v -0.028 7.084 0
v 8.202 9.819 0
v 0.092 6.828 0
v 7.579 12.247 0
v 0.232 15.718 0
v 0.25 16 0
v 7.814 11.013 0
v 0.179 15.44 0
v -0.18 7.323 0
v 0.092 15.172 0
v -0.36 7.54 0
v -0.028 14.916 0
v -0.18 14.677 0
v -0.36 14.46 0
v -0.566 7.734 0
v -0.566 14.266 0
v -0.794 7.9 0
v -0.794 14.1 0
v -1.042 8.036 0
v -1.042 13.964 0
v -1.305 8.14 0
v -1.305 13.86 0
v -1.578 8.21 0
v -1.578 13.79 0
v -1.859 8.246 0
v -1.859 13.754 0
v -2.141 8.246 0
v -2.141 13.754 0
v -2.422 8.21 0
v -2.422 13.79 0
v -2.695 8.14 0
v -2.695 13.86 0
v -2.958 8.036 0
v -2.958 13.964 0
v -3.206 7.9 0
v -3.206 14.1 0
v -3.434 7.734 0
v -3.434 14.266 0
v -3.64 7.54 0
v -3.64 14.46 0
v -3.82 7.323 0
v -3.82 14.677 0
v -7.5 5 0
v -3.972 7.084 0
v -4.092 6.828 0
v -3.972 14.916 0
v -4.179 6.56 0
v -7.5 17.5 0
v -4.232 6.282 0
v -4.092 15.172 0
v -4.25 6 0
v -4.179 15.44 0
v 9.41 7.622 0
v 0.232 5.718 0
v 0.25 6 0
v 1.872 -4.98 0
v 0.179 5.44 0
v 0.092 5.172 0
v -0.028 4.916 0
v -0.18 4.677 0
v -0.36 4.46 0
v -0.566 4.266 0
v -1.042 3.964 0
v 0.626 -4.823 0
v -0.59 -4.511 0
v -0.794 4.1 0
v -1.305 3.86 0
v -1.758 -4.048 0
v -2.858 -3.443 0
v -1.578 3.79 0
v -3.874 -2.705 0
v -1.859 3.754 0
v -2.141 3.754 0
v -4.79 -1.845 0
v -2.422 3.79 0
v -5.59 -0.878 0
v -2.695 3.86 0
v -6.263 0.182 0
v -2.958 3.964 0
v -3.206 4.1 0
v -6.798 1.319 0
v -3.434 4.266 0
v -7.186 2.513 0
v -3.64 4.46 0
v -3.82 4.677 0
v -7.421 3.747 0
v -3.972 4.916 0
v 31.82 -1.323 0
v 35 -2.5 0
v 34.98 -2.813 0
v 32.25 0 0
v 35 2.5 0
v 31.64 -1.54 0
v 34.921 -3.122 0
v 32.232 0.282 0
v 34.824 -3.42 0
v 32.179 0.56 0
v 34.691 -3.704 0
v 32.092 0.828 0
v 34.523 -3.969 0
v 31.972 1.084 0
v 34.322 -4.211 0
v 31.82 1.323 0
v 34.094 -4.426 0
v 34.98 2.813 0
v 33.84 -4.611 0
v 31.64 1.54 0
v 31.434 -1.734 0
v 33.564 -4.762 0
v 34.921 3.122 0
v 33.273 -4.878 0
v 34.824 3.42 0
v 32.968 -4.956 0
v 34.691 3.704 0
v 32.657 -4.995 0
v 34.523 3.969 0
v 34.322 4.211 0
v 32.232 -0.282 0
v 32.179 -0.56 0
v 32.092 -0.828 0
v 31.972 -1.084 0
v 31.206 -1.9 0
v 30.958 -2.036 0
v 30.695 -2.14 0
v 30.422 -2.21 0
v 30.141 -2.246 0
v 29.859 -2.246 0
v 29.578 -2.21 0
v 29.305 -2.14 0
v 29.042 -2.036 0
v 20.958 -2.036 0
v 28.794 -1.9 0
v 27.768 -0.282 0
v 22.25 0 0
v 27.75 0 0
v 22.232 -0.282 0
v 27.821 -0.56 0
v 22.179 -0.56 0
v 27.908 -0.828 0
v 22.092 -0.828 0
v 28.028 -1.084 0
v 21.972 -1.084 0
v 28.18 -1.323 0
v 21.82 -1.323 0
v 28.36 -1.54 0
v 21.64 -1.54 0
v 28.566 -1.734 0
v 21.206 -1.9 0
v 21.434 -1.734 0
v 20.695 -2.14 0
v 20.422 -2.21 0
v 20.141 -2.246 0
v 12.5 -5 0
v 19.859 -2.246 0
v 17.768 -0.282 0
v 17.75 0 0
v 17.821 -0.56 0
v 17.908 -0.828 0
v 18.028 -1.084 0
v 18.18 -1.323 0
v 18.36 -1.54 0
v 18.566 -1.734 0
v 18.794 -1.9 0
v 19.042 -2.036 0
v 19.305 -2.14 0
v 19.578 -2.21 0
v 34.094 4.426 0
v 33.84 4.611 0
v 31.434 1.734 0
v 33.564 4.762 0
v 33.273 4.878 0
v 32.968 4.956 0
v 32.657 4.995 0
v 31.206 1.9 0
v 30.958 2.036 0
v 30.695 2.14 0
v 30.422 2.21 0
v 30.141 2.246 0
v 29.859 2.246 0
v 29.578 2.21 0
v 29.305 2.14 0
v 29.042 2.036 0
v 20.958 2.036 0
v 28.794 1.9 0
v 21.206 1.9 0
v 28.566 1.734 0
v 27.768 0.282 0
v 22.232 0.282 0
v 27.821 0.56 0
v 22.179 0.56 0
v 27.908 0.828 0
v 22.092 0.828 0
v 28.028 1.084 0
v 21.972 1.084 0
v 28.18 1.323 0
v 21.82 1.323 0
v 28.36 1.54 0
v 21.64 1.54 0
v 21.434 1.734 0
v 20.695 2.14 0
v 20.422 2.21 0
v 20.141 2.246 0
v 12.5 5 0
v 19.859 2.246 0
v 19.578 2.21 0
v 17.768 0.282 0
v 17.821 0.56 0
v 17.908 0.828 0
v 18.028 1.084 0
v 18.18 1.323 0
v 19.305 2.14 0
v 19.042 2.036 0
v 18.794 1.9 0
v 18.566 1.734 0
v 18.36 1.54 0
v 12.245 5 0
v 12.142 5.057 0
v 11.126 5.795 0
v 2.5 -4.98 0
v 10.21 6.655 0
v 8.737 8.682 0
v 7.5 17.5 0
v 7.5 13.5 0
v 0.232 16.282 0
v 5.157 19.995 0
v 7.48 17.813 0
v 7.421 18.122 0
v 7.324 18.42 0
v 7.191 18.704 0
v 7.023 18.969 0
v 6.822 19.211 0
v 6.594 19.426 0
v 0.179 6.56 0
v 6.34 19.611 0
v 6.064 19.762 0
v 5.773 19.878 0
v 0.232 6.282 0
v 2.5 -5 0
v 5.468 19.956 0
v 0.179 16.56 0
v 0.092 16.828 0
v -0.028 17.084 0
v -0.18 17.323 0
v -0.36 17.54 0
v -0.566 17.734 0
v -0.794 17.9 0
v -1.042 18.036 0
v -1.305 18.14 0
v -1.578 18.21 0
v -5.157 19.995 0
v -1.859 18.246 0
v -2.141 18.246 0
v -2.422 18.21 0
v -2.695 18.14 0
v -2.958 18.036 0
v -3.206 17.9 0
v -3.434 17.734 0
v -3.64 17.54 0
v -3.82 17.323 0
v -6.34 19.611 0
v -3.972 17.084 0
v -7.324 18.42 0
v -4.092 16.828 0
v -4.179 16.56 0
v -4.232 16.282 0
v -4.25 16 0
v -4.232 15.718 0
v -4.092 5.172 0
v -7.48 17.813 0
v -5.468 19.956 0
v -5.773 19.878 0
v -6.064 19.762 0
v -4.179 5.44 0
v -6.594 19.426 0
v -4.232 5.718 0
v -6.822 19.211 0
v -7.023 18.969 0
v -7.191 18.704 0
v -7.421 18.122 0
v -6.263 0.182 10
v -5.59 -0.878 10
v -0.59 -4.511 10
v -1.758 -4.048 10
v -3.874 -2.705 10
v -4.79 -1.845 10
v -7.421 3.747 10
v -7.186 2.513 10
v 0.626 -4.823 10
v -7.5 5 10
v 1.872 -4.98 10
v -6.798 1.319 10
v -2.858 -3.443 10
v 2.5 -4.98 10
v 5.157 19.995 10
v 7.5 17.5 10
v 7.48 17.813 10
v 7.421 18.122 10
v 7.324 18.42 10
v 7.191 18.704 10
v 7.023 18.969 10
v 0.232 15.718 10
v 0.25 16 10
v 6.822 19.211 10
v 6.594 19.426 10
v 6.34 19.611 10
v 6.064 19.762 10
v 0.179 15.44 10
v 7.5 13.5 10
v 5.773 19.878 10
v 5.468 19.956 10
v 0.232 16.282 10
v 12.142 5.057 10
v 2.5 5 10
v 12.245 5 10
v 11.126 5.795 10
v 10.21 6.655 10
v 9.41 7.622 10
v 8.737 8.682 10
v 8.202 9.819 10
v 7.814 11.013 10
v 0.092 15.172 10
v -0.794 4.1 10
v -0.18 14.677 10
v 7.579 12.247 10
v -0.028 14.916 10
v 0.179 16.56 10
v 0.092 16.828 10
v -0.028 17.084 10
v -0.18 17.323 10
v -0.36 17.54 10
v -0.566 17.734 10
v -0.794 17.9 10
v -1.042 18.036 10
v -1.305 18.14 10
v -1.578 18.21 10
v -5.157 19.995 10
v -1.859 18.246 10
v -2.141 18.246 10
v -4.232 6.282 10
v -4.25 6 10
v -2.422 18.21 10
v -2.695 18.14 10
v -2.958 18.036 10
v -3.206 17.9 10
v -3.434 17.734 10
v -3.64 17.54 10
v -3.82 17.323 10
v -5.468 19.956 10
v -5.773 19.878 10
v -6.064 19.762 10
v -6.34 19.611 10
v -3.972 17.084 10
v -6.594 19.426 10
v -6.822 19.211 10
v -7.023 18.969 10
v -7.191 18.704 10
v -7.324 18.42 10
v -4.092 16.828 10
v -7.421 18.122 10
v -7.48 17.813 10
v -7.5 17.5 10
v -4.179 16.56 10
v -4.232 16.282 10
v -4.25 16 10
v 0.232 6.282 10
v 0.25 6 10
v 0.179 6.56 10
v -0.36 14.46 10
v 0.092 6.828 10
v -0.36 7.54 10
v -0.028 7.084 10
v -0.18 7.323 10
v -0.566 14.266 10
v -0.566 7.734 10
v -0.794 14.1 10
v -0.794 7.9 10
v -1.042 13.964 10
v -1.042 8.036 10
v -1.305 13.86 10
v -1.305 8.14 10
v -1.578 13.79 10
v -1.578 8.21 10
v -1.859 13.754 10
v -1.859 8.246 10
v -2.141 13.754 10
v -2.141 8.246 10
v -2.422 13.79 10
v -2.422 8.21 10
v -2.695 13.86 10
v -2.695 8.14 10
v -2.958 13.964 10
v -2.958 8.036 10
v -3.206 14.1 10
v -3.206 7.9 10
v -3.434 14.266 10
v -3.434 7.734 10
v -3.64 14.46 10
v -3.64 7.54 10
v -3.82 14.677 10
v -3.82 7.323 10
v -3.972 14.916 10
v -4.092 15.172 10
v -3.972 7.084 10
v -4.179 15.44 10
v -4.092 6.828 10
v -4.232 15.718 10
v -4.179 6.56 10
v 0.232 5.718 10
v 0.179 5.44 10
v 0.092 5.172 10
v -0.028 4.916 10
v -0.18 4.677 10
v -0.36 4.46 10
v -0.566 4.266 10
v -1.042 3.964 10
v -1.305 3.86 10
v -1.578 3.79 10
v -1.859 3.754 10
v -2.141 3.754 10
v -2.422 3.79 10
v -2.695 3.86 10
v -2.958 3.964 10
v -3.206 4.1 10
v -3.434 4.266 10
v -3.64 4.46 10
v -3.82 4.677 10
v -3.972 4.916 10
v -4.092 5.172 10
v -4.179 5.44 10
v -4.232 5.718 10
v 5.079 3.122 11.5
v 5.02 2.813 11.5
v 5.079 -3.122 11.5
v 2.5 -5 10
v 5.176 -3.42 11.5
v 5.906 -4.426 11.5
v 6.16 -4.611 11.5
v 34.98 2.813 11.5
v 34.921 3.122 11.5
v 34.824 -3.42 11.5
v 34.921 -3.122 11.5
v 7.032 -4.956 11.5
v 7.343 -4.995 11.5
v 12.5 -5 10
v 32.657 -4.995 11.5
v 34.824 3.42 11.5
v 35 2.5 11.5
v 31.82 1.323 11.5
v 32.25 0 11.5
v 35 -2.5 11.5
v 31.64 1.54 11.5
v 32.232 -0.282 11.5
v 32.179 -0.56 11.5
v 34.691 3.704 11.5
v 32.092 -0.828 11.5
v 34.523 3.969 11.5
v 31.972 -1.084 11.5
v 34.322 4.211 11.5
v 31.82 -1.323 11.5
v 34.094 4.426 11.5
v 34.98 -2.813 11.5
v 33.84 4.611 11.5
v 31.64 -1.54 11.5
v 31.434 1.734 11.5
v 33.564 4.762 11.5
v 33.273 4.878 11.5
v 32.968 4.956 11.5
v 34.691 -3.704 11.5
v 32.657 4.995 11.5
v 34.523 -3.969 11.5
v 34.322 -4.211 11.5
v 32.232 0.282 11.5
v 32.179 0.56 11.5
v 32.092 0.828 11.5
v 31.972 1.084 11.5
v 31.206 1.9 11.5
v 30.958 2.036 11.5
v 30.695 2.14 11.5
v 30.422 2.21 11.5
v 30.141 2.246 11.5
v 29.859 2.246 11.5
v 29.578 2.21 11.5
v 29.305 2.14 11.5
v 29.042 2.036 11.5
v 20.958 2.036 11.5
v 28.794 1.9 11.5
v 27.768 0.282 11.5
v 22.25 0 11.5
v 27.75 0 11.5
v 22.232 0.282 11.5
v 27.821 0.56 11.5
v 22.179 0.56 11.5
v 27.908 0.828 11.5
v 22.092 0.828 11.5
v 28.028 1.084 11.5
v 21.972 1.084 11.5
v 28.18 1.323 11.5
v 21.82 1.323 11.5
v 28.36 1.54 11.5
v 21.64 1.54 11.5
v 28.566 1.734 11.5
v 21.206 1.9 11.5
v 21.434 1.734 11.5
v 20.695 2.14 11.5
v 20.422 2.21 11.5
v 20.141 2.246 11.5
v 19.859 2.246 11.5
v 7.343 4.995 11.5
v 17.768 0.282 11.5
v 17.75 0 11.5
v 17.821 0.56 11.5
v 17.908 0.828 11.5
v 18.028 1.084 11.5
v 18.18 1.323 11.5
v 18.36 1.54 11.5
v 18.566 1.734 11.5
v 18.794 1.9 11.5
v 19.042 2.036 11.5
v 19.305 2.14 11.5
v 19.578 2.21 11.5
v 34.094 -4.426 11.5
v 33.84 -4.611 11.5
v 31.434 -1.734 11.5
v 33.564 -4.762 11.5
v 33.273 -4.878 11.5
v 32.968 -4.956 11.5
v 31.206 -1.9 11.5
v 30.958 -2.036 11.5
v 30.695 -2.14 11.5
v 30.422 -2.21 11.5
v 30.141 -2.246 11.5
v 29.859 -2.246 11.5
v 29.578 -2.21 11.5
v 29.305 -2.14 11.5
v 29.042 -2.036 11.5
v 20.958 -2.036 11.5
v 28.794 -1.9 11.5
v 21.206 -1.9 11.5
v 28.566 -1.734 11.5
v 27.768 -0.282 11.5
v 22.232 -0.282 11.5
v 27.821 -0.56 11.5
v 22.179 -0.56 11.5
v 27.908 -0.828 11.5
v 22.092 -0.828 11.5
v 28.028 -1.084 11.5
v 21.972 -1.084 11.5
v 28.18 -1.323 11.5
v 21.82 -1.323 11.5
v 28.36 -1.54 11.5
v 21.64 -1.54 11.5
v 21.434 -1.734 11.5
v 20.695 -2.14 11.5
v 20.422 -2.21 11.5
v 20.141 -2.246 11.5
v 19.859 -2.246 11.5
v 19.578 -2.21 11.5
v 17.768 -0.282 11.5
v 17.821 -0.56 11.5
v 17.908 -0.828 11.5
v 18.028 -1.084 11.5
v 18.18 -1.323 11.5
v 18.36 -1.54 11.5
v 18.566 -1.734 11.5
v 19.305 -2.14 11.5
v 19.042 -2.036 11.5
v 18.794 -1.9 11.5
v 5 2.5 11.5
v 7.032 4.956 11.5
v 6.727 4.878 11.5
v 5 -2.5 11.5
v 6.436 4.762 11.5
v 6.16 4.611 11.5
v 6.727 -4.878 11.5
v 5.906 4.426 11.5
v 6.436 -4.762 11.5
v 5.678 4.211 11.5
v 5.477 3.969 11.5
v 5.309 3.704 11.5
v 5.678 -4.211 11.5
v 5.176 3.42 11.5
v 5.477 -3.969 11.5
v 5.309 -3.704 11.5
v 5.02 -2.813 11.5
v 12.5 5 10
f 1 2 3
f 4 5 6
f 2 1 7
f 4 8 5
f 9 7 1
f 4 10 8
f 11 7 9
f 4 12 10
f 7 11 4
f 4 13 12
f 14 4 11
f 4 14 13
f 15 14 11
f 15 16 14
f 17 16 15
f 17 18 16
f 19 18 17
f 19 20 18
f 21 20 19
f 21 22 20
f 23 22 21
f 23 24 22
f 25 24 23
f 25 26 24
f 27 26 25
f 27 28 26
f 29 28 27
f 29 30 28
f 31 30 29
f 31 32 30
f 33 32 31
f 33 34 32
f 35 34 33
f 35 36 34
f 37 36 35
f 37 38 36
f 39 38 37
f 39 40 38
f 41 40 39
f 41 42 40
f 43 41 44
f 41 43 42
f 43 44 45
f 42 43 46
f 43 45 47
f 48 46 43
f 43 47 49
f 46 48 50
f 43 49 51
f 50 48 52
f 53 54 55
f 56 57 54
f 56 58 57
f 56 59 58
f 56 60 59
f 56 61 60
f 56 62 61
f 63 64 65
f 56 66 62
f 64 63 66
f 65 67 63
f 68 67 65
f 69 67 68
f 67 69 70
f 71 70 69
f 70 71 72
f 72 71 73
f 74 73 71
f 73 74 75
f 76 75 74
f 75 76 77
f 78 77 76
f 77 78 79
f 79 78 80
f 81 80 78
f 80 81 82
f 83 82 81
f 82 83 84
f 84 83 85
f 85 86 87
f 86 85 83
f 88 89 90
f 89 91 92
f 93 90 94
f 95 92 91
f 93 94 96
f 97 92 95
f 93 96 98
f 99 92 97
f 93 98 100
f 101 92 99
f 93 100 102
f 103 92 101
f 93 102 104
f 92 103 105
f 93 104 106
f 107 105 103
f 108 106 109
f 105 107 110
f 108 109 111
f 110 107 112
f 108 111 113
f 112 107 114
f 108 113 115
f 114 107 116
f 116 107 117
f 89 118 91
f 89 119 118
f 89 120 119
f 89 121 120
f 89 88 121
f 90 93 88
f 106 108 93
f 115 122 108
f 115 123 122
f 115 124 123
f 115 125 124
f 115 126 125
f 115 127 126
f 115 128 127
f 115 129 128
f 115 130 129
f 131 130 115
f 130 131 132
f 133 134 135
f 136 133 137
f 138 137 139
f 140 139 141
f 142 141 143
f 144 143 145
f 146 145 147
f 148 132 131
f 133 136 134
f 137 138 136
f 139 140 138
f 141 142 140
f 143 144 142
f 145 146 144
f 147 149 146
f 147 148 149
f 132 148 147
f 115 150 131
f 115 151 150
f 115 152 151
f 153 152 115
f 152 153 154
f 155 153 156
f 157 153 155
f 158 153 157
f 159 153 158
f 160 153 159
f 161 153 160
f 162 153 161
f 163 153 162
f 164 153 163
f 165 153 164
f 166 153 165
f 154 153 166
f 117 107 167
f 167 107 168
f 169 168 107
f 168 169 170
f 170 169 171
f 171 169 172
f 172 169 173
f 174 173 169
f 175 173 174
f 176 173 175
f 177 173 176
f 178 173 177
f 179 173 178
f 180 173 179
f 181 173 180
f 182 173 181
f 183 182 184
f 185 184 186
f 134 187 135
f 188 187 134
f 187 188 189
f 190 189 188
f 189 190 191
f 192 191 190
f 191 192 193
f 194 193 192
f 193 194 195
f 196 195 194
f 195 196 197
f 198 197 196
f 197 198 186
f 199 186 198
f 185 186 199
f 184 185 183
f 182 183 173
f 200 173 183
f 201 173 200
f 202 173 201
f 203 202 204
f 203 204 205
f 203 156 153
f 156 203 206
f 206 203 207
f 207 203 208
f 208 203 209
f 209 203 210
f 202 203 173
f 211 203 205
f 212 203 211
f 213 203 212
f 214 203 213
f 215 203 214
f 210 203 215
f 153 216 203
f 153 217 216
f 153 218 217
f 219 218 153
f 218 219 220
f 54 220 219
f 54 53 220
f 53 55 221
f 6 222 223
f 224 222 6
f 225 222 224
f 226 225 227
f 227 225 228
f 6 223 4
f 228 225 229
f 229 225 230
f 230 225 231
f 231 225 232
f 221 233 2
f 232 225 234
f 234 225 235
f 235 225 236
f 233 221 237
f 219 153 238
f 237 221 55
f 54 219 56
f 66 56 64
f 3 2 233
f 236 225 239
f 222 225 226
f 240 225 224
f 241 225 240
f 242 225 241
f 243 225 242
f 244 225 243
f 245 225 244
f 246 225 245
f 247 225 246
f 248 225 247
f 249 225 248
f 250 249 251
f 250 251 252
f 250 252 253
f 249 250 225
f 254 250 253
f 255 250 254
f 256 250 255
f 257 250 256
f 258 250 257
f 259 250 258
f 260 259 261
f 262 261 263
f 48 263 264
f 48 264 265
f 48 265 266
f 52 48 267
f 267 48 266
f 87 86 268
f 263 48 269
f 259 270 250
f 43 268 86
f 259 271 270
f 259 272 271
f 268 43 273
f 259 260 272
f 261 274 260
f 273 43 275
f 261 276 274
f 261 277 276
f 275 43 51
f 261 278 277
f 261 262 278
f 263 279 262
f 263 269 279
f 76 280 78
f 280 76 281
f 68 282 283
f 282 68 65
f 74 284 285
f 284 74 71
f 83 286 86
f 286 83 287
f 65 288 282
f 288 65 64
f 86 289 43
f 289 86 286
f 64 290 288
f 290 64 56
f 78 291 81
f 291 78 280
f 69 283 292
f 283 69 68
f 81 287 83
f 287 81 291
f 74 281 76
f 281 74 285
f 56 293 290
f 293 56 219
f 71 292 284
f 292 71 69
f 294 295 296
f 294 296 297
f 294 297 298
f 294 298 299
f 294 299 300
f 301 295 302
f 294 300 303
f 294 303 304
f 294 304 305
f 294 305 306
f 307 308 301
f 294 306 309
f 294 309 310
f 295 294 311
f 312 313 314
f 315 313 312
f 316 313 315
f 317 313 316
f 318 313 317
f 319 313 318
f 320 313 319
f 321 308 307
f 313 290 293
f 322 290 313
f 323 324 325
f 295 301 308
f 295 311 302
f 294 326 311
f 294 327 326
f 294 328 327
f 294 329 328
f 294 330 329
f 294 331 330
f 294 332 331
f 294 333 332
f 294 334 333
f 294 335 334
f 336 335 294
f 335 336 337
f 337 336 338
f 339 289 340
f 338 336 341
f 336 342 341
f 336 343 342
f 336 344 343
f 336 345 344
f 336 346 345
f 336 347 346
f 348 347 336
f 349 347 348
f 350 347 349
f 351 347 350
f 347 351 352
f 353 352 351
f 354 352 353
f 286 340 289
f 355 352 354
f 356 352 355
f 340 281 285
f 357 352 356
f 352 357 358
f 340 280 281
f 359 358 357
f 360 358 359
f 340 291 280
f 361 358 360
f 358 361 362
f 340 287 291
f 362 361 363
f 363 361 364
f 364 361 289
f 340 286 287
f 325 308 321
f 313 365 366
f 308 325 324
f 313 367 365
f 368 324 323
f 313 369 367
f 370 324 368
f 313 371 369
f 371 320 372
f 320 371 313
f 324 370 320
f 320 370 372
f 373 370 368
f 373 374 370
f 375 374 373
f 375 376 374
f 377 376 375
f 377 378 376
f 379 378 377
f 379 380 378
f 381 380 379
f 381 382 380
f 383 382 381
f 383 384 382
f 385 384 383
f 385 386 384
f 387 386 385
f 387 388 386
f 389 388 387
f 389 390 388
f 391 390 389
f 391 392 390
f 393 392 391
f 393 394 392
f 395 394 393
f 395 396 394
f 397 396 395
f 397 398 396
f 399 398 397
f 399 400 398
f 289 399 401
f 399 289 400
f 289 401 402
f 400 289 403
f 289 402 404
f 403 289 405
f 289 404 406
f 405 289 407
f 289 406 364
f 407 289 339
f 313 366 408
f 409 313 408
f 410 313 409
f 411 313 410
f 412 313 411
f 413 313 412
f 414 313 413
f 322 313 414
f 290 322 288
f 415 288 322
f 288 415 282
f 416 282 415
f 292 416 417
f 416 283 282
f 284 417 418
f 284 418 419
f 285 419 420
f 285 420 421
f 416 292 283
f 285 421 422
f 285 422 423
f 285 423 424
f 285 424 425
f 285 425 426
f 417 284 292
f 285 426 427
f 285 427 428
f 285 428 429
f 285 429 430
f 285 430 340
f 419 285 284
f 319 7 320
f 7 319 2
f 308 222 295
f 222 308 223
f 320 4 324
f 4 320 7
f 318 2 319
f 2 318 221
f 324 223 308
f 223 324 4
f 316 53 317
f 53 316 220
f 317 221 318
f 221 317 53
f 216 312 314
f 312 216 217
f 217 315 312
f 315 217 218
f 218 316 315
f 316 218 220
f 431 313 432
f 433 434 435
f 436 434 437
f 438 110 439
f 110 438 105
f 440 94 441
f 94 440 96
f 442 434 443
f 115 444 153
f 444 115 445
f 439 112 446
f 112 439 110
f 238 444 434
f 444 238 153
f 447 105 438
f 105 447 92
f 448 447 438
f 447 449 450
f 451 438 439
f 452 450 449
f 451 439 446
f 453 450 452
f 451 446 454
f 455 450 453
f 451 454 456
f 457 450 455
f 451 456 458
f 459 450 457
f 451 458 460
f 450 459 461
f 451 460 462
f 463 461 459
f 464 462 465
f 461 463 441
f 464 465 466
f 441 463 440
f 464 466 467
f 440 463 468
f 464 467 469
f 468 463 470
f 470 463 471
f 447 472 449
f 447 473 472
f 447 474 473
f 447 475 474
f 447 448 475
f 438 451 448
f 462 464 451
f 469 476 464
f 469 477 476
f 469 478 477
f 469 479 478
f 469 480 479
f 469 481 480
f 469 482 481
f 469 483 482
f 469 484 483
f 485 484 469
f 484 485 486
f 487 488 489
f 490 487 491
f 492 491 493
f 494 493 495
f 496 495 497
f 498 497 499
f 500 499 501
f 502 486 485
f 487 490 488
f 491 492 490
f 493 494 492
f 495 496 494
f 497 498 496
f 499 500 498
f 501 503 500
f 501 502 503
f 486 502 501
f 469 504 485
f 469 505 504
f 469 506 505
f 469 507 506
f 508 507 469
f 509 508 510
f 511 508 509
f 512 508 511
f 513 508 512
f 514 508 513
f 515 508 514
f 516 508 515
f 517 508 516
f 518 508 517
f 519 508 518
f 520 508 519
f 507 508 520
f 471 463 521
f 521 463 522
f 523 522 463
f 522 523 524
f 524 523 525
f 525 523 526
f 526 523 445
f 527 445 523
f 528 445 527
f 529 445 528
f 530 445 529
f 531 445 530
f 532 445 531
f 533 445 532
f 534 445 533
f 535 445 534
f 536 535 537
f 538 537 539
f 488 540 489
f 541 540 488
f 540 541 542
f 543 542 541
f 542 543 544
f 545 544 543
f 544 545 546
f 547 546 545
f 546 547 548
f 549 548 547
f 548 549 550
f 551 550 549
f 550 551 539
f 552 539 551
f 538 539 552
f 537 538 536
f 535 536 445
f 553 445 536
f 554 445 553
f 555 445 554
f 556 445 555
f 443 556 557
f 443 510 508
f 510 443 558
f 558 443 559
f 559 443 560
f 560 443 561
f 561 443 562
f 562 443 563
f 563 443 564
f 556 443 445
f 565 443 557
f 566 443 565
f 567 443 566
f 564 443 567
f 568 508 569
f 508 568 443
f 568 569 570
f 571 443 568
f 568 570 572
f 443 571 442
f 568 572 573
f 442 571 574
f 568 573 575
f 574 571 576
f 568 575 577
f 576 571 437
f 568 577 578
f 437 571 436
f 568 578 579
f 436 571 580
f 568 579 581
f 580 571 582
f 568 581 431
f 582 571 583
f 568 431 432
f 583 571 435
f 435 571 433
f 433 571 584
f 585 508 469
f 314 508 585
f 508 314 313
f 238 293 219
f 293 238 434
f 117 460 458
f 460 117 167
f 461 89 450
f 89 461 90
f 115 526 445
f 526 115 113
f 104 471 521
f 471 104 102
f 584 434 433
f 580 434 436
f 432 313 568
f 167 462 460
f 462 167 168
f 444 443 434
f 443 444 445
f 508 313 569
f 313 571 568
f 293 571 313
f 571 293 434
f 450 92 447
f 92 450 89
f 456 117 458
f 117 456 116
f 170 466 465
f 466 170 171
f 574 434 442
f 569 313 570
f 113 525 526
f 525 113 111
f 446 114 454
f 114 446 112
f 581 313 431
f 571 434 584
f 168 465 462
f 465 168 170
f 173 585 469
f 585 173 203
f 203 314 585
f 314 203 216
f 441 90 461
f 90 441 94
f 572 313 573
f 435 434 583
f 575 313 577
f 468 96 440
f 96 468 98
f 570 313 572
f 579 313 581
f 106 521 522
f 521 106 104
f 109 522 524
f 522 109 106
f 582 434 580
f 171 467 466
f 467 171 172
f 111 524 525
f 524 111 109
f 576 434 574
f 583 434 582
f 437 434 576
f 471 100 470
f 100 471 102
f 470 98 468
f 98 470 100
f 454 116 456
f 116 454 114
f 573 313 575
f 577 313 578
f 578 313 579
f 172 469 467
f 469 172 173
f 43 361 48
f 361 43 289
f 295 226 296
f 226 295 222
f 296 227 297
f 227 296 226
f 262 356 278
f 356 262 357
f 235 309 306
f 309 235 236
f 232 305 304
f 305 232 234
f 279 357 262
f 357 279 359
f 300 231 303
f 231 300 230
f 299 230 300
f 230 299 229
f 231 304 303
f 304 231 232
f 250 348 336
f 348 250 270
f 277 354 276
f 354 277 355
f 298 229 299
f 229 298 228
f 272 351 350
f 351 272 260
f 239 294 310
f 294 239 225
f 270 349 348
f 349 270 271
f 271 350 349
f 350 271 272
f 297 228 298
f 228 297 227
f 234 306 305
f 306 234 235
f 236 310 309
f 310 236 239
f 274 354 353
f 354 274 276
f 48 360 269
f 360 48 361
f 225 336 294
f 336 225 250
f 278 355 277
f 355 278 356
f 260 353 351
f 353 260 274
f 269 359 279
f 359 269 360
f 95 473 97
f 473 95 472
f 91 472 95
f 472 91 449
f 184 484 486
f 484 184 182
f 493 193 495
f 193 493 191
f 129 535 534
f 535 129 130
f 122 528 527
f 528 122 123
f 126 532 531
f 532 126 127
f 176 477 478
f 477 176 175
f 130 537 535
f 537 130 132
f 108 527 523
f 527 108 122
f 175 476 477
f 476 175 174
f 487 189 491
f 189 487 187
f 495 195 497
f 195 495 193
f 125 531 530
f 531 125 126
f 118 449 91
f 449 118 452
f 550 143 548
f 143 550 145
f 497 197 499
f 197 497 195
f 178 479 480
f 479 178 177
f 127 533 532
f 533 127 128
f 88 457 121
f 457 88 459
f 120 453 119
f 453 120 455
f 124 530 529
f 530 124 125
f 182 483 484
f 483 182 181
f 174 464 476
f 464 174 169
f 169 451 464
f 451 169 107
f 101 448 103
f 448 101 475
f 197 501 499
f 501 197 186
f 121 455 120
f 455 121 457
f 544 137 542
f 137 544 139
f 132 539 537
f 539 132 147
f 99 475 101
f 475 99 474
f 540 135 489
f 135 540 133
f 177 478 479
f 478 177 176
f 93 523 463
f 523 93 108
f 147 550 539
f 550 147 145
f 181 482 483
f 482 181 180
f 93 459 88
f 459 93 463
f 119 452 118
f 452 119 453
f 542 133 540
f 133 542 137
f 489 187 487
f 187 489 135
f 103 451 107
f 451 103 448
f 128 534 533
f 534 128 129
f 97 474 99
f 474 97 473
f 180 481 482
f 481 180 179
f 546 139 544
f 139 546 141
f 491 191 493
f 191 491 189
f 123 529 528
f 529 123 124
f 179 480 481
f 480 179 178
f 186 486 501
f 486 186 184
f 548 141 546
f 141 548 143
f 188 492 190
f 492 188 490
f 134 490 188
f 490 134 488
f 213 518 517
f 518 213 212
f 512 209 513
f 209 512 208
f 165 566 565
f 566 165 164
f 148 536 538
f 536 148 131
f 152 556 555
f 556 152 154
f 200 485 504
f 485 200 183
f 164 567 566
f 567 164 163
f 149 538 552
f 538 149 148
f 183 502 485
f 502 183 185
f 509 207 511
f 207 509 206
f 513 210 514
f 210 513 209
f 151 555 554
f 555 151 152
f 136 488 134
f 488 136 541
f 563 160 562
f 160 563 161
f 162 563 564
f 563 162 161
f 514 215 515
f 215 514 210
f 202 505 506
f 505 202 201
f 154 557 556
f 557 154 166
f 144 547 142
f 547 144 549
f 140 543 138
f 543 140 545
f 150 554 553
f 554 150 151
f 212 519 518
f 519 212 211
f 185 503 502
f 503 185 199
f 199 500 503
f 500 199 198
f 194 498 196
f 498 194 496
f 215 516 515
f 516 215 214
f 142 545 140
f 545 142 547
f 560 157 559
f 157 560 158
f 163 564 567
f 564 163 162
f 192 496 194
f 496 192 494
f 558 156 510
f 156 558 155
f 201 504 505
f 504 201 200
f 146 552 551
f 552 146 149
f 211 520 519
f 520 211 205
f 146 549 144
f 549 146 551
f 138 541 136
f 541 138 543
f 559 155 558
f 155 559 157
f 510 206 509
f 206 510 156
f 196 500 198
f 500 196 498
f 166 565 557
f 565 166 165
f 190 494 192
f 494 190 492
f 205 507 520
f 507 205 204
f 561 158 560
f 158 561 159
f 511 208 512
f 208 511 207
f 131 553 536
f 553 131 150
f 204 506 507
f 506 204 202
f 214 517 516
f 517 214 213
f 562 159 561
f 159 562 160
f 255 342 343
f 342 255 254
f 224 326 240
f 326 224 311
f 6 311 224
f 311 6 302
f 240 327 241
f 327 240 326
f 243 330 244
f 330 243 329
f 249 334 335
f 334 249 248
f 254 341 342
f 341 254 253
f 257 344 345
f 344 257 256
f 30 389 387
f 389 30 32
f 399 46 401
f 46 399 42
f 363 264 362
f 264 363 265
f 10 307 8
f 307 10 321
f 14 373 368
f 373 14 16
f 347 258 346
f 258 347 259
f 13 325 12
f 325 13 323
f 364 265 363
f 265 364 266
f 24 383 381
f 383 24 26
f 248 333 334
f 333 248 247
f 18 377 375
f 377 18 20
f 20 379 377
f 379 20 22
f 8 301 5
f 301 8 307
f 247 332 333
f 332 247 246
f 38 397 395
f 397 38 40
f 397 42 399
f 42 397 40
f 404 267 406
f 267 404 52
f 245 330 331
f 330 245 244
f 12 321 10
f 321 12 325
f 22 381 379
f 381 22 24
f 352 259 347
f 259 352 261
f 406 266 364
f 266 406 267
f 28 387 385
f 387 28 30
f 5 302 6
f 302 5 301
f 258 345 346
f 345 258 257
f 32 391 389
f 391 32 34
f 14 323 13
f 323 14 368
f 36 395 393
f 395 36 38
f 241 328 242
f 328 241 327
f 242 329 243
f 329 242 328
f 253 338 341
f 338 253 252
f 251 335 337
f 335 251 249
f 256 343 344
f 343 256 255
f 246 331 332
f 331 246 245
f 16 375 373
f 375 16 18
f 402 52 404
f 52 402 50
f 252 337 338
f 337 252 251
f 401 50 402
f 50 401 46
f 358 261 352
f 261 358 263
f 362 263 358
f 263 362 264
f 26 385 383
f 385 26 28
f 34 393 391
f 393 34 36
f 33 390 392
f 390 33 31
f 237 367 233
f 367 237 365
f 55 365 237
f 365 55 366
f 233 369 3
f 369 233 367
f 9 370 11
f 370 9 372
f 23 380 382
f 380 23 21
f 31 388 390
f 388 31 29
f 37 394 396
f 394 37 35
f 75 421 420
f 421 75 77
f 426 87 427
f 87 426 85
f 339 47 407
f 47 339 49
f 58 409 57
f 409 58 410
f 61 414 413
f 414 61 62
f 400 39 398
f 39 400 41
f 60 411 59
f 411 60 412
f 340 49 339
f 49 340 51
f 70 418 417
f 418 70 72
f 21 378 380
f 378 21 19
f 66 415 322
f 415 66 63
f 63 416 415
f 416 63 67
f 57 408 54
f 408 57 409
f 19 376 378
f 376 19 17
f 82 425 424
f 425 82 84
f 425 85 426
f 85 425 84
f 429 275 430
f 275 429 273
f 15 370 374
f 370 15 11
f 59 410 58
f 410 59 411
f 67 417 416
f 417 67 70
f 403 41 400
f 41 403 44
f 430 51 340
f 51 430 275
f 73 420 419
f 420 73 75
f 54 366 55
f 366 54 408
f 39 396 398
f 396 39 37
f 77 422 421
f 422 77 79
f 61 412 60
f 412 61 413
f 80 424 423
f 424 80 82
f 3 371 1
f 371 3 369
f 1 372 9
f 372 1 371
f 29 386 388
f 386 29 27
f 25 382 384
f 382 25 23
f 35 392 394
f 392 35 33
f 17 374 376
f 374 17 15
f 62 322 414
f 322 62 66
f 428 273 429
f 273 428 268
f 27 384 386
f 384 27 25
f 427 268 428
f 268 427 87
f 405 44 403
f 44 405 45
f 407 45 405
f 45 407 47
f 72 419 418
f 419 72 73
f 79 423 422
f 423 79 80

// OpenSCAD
CORNER_DIA = 5;
BEND_DIA = 20;
BEND_OFFSET_X = 0; //-1.5;
BEND_OFFSET_Y= -1.5;

LENGTH_X = 40 - BEND_DIA/2;
WIDTH_X = 10;
THICKNESS_X = 10 + 1.5;

LENGTH_Y = 25 - BEND_DIA/2; // 15 - BEND_DIA/2;
WIDTH_Y = 15;
THICKNESS_Y = 10;

HOLE_DIA = 4.5;
HOLE_OFFSETS = [
  [30, 0], [20, 0],
  [-2, 16], [-2, 6] // 0.5
];


$fn = 50;

module rounded_rect(width, length, height, corner_dia) {
  hull() {
    for (i = [-1, 1]) {
      for (j = [-1, 1]) {
        translate([i*(width-corner_dia)/2, j*(length-corner_dia)/2, 0])
        cylinder(d = corner_dia, h = height);
      }
    }
  }
}

module bend() {
  difference() {
    translate([BEND_DIA/2 - WIDTH_Y/2, BEND_DIA/2 - WIDTH_X/2, 0])
    cylinder(d = BEND_DIA, h = THICKNESS_Y);

    #translate([BEND_OFFSET_X, BEND_OFFSET_Y, 0])
    hull() {
      translate([WIDTH_Y/2 + BEND_DIA/2, WIDTH_X/2 + BEND_DIA/2, 0])
      cylinder(d = BEND_DIA, h = THICKNESS_Y);

      translate([WIDTH_Y/2 + BEND_DIA/2, WIDTH_X/2 + BEND_DIA/2 + 10, 0])
      cylinder(d = BEND_DIA, h = THICKNESS_Y);
    }
  }
}

difference() {
  union() {
    hull() {
      translate([LENGTH_X/2 + BEND_DIA/4, 0, 0])
      rounded_rect(LENGTH_X, WIDTH_X, THICKNESS_X, CORNER_DIA);

      translate([WIDTH_Y/2 - BEND_DIA/4, -WIDTH_X/2, 0])
      cube(size = [WIDTH_X, WIDTH_X, THICKNESS_Y]);
    }

    hull() {
      translate([0, LENGTH_Y/2 + BEND_DIA/4, 0])
      rounded_rect(WIDTH_Y, LENGTH_Y, THICKNESS_Y, CORNER_DIA);

      translate([-WIDTH_Y/2, BEND_DIA/4, 0])
      cube(size = [WIDTH_Y, 1, THICKNESS_Y]);
    }

    intersection() {
      #bend();
      translate([-WIDTH_Y/2, -BEND_DIA/4, 0])
      cube(size = [WIDTH_Y * 2, LENGTH_Y + BEND_DIA/2 - 1, THICKNESS_Y]);
    }
  }

  #for(o = HOLE_OFFSETS) {
    translate([o[0], o[1], 0])
    cylinder(d = HOLE_DIA, h = THICKNESS_X);
  }
}
